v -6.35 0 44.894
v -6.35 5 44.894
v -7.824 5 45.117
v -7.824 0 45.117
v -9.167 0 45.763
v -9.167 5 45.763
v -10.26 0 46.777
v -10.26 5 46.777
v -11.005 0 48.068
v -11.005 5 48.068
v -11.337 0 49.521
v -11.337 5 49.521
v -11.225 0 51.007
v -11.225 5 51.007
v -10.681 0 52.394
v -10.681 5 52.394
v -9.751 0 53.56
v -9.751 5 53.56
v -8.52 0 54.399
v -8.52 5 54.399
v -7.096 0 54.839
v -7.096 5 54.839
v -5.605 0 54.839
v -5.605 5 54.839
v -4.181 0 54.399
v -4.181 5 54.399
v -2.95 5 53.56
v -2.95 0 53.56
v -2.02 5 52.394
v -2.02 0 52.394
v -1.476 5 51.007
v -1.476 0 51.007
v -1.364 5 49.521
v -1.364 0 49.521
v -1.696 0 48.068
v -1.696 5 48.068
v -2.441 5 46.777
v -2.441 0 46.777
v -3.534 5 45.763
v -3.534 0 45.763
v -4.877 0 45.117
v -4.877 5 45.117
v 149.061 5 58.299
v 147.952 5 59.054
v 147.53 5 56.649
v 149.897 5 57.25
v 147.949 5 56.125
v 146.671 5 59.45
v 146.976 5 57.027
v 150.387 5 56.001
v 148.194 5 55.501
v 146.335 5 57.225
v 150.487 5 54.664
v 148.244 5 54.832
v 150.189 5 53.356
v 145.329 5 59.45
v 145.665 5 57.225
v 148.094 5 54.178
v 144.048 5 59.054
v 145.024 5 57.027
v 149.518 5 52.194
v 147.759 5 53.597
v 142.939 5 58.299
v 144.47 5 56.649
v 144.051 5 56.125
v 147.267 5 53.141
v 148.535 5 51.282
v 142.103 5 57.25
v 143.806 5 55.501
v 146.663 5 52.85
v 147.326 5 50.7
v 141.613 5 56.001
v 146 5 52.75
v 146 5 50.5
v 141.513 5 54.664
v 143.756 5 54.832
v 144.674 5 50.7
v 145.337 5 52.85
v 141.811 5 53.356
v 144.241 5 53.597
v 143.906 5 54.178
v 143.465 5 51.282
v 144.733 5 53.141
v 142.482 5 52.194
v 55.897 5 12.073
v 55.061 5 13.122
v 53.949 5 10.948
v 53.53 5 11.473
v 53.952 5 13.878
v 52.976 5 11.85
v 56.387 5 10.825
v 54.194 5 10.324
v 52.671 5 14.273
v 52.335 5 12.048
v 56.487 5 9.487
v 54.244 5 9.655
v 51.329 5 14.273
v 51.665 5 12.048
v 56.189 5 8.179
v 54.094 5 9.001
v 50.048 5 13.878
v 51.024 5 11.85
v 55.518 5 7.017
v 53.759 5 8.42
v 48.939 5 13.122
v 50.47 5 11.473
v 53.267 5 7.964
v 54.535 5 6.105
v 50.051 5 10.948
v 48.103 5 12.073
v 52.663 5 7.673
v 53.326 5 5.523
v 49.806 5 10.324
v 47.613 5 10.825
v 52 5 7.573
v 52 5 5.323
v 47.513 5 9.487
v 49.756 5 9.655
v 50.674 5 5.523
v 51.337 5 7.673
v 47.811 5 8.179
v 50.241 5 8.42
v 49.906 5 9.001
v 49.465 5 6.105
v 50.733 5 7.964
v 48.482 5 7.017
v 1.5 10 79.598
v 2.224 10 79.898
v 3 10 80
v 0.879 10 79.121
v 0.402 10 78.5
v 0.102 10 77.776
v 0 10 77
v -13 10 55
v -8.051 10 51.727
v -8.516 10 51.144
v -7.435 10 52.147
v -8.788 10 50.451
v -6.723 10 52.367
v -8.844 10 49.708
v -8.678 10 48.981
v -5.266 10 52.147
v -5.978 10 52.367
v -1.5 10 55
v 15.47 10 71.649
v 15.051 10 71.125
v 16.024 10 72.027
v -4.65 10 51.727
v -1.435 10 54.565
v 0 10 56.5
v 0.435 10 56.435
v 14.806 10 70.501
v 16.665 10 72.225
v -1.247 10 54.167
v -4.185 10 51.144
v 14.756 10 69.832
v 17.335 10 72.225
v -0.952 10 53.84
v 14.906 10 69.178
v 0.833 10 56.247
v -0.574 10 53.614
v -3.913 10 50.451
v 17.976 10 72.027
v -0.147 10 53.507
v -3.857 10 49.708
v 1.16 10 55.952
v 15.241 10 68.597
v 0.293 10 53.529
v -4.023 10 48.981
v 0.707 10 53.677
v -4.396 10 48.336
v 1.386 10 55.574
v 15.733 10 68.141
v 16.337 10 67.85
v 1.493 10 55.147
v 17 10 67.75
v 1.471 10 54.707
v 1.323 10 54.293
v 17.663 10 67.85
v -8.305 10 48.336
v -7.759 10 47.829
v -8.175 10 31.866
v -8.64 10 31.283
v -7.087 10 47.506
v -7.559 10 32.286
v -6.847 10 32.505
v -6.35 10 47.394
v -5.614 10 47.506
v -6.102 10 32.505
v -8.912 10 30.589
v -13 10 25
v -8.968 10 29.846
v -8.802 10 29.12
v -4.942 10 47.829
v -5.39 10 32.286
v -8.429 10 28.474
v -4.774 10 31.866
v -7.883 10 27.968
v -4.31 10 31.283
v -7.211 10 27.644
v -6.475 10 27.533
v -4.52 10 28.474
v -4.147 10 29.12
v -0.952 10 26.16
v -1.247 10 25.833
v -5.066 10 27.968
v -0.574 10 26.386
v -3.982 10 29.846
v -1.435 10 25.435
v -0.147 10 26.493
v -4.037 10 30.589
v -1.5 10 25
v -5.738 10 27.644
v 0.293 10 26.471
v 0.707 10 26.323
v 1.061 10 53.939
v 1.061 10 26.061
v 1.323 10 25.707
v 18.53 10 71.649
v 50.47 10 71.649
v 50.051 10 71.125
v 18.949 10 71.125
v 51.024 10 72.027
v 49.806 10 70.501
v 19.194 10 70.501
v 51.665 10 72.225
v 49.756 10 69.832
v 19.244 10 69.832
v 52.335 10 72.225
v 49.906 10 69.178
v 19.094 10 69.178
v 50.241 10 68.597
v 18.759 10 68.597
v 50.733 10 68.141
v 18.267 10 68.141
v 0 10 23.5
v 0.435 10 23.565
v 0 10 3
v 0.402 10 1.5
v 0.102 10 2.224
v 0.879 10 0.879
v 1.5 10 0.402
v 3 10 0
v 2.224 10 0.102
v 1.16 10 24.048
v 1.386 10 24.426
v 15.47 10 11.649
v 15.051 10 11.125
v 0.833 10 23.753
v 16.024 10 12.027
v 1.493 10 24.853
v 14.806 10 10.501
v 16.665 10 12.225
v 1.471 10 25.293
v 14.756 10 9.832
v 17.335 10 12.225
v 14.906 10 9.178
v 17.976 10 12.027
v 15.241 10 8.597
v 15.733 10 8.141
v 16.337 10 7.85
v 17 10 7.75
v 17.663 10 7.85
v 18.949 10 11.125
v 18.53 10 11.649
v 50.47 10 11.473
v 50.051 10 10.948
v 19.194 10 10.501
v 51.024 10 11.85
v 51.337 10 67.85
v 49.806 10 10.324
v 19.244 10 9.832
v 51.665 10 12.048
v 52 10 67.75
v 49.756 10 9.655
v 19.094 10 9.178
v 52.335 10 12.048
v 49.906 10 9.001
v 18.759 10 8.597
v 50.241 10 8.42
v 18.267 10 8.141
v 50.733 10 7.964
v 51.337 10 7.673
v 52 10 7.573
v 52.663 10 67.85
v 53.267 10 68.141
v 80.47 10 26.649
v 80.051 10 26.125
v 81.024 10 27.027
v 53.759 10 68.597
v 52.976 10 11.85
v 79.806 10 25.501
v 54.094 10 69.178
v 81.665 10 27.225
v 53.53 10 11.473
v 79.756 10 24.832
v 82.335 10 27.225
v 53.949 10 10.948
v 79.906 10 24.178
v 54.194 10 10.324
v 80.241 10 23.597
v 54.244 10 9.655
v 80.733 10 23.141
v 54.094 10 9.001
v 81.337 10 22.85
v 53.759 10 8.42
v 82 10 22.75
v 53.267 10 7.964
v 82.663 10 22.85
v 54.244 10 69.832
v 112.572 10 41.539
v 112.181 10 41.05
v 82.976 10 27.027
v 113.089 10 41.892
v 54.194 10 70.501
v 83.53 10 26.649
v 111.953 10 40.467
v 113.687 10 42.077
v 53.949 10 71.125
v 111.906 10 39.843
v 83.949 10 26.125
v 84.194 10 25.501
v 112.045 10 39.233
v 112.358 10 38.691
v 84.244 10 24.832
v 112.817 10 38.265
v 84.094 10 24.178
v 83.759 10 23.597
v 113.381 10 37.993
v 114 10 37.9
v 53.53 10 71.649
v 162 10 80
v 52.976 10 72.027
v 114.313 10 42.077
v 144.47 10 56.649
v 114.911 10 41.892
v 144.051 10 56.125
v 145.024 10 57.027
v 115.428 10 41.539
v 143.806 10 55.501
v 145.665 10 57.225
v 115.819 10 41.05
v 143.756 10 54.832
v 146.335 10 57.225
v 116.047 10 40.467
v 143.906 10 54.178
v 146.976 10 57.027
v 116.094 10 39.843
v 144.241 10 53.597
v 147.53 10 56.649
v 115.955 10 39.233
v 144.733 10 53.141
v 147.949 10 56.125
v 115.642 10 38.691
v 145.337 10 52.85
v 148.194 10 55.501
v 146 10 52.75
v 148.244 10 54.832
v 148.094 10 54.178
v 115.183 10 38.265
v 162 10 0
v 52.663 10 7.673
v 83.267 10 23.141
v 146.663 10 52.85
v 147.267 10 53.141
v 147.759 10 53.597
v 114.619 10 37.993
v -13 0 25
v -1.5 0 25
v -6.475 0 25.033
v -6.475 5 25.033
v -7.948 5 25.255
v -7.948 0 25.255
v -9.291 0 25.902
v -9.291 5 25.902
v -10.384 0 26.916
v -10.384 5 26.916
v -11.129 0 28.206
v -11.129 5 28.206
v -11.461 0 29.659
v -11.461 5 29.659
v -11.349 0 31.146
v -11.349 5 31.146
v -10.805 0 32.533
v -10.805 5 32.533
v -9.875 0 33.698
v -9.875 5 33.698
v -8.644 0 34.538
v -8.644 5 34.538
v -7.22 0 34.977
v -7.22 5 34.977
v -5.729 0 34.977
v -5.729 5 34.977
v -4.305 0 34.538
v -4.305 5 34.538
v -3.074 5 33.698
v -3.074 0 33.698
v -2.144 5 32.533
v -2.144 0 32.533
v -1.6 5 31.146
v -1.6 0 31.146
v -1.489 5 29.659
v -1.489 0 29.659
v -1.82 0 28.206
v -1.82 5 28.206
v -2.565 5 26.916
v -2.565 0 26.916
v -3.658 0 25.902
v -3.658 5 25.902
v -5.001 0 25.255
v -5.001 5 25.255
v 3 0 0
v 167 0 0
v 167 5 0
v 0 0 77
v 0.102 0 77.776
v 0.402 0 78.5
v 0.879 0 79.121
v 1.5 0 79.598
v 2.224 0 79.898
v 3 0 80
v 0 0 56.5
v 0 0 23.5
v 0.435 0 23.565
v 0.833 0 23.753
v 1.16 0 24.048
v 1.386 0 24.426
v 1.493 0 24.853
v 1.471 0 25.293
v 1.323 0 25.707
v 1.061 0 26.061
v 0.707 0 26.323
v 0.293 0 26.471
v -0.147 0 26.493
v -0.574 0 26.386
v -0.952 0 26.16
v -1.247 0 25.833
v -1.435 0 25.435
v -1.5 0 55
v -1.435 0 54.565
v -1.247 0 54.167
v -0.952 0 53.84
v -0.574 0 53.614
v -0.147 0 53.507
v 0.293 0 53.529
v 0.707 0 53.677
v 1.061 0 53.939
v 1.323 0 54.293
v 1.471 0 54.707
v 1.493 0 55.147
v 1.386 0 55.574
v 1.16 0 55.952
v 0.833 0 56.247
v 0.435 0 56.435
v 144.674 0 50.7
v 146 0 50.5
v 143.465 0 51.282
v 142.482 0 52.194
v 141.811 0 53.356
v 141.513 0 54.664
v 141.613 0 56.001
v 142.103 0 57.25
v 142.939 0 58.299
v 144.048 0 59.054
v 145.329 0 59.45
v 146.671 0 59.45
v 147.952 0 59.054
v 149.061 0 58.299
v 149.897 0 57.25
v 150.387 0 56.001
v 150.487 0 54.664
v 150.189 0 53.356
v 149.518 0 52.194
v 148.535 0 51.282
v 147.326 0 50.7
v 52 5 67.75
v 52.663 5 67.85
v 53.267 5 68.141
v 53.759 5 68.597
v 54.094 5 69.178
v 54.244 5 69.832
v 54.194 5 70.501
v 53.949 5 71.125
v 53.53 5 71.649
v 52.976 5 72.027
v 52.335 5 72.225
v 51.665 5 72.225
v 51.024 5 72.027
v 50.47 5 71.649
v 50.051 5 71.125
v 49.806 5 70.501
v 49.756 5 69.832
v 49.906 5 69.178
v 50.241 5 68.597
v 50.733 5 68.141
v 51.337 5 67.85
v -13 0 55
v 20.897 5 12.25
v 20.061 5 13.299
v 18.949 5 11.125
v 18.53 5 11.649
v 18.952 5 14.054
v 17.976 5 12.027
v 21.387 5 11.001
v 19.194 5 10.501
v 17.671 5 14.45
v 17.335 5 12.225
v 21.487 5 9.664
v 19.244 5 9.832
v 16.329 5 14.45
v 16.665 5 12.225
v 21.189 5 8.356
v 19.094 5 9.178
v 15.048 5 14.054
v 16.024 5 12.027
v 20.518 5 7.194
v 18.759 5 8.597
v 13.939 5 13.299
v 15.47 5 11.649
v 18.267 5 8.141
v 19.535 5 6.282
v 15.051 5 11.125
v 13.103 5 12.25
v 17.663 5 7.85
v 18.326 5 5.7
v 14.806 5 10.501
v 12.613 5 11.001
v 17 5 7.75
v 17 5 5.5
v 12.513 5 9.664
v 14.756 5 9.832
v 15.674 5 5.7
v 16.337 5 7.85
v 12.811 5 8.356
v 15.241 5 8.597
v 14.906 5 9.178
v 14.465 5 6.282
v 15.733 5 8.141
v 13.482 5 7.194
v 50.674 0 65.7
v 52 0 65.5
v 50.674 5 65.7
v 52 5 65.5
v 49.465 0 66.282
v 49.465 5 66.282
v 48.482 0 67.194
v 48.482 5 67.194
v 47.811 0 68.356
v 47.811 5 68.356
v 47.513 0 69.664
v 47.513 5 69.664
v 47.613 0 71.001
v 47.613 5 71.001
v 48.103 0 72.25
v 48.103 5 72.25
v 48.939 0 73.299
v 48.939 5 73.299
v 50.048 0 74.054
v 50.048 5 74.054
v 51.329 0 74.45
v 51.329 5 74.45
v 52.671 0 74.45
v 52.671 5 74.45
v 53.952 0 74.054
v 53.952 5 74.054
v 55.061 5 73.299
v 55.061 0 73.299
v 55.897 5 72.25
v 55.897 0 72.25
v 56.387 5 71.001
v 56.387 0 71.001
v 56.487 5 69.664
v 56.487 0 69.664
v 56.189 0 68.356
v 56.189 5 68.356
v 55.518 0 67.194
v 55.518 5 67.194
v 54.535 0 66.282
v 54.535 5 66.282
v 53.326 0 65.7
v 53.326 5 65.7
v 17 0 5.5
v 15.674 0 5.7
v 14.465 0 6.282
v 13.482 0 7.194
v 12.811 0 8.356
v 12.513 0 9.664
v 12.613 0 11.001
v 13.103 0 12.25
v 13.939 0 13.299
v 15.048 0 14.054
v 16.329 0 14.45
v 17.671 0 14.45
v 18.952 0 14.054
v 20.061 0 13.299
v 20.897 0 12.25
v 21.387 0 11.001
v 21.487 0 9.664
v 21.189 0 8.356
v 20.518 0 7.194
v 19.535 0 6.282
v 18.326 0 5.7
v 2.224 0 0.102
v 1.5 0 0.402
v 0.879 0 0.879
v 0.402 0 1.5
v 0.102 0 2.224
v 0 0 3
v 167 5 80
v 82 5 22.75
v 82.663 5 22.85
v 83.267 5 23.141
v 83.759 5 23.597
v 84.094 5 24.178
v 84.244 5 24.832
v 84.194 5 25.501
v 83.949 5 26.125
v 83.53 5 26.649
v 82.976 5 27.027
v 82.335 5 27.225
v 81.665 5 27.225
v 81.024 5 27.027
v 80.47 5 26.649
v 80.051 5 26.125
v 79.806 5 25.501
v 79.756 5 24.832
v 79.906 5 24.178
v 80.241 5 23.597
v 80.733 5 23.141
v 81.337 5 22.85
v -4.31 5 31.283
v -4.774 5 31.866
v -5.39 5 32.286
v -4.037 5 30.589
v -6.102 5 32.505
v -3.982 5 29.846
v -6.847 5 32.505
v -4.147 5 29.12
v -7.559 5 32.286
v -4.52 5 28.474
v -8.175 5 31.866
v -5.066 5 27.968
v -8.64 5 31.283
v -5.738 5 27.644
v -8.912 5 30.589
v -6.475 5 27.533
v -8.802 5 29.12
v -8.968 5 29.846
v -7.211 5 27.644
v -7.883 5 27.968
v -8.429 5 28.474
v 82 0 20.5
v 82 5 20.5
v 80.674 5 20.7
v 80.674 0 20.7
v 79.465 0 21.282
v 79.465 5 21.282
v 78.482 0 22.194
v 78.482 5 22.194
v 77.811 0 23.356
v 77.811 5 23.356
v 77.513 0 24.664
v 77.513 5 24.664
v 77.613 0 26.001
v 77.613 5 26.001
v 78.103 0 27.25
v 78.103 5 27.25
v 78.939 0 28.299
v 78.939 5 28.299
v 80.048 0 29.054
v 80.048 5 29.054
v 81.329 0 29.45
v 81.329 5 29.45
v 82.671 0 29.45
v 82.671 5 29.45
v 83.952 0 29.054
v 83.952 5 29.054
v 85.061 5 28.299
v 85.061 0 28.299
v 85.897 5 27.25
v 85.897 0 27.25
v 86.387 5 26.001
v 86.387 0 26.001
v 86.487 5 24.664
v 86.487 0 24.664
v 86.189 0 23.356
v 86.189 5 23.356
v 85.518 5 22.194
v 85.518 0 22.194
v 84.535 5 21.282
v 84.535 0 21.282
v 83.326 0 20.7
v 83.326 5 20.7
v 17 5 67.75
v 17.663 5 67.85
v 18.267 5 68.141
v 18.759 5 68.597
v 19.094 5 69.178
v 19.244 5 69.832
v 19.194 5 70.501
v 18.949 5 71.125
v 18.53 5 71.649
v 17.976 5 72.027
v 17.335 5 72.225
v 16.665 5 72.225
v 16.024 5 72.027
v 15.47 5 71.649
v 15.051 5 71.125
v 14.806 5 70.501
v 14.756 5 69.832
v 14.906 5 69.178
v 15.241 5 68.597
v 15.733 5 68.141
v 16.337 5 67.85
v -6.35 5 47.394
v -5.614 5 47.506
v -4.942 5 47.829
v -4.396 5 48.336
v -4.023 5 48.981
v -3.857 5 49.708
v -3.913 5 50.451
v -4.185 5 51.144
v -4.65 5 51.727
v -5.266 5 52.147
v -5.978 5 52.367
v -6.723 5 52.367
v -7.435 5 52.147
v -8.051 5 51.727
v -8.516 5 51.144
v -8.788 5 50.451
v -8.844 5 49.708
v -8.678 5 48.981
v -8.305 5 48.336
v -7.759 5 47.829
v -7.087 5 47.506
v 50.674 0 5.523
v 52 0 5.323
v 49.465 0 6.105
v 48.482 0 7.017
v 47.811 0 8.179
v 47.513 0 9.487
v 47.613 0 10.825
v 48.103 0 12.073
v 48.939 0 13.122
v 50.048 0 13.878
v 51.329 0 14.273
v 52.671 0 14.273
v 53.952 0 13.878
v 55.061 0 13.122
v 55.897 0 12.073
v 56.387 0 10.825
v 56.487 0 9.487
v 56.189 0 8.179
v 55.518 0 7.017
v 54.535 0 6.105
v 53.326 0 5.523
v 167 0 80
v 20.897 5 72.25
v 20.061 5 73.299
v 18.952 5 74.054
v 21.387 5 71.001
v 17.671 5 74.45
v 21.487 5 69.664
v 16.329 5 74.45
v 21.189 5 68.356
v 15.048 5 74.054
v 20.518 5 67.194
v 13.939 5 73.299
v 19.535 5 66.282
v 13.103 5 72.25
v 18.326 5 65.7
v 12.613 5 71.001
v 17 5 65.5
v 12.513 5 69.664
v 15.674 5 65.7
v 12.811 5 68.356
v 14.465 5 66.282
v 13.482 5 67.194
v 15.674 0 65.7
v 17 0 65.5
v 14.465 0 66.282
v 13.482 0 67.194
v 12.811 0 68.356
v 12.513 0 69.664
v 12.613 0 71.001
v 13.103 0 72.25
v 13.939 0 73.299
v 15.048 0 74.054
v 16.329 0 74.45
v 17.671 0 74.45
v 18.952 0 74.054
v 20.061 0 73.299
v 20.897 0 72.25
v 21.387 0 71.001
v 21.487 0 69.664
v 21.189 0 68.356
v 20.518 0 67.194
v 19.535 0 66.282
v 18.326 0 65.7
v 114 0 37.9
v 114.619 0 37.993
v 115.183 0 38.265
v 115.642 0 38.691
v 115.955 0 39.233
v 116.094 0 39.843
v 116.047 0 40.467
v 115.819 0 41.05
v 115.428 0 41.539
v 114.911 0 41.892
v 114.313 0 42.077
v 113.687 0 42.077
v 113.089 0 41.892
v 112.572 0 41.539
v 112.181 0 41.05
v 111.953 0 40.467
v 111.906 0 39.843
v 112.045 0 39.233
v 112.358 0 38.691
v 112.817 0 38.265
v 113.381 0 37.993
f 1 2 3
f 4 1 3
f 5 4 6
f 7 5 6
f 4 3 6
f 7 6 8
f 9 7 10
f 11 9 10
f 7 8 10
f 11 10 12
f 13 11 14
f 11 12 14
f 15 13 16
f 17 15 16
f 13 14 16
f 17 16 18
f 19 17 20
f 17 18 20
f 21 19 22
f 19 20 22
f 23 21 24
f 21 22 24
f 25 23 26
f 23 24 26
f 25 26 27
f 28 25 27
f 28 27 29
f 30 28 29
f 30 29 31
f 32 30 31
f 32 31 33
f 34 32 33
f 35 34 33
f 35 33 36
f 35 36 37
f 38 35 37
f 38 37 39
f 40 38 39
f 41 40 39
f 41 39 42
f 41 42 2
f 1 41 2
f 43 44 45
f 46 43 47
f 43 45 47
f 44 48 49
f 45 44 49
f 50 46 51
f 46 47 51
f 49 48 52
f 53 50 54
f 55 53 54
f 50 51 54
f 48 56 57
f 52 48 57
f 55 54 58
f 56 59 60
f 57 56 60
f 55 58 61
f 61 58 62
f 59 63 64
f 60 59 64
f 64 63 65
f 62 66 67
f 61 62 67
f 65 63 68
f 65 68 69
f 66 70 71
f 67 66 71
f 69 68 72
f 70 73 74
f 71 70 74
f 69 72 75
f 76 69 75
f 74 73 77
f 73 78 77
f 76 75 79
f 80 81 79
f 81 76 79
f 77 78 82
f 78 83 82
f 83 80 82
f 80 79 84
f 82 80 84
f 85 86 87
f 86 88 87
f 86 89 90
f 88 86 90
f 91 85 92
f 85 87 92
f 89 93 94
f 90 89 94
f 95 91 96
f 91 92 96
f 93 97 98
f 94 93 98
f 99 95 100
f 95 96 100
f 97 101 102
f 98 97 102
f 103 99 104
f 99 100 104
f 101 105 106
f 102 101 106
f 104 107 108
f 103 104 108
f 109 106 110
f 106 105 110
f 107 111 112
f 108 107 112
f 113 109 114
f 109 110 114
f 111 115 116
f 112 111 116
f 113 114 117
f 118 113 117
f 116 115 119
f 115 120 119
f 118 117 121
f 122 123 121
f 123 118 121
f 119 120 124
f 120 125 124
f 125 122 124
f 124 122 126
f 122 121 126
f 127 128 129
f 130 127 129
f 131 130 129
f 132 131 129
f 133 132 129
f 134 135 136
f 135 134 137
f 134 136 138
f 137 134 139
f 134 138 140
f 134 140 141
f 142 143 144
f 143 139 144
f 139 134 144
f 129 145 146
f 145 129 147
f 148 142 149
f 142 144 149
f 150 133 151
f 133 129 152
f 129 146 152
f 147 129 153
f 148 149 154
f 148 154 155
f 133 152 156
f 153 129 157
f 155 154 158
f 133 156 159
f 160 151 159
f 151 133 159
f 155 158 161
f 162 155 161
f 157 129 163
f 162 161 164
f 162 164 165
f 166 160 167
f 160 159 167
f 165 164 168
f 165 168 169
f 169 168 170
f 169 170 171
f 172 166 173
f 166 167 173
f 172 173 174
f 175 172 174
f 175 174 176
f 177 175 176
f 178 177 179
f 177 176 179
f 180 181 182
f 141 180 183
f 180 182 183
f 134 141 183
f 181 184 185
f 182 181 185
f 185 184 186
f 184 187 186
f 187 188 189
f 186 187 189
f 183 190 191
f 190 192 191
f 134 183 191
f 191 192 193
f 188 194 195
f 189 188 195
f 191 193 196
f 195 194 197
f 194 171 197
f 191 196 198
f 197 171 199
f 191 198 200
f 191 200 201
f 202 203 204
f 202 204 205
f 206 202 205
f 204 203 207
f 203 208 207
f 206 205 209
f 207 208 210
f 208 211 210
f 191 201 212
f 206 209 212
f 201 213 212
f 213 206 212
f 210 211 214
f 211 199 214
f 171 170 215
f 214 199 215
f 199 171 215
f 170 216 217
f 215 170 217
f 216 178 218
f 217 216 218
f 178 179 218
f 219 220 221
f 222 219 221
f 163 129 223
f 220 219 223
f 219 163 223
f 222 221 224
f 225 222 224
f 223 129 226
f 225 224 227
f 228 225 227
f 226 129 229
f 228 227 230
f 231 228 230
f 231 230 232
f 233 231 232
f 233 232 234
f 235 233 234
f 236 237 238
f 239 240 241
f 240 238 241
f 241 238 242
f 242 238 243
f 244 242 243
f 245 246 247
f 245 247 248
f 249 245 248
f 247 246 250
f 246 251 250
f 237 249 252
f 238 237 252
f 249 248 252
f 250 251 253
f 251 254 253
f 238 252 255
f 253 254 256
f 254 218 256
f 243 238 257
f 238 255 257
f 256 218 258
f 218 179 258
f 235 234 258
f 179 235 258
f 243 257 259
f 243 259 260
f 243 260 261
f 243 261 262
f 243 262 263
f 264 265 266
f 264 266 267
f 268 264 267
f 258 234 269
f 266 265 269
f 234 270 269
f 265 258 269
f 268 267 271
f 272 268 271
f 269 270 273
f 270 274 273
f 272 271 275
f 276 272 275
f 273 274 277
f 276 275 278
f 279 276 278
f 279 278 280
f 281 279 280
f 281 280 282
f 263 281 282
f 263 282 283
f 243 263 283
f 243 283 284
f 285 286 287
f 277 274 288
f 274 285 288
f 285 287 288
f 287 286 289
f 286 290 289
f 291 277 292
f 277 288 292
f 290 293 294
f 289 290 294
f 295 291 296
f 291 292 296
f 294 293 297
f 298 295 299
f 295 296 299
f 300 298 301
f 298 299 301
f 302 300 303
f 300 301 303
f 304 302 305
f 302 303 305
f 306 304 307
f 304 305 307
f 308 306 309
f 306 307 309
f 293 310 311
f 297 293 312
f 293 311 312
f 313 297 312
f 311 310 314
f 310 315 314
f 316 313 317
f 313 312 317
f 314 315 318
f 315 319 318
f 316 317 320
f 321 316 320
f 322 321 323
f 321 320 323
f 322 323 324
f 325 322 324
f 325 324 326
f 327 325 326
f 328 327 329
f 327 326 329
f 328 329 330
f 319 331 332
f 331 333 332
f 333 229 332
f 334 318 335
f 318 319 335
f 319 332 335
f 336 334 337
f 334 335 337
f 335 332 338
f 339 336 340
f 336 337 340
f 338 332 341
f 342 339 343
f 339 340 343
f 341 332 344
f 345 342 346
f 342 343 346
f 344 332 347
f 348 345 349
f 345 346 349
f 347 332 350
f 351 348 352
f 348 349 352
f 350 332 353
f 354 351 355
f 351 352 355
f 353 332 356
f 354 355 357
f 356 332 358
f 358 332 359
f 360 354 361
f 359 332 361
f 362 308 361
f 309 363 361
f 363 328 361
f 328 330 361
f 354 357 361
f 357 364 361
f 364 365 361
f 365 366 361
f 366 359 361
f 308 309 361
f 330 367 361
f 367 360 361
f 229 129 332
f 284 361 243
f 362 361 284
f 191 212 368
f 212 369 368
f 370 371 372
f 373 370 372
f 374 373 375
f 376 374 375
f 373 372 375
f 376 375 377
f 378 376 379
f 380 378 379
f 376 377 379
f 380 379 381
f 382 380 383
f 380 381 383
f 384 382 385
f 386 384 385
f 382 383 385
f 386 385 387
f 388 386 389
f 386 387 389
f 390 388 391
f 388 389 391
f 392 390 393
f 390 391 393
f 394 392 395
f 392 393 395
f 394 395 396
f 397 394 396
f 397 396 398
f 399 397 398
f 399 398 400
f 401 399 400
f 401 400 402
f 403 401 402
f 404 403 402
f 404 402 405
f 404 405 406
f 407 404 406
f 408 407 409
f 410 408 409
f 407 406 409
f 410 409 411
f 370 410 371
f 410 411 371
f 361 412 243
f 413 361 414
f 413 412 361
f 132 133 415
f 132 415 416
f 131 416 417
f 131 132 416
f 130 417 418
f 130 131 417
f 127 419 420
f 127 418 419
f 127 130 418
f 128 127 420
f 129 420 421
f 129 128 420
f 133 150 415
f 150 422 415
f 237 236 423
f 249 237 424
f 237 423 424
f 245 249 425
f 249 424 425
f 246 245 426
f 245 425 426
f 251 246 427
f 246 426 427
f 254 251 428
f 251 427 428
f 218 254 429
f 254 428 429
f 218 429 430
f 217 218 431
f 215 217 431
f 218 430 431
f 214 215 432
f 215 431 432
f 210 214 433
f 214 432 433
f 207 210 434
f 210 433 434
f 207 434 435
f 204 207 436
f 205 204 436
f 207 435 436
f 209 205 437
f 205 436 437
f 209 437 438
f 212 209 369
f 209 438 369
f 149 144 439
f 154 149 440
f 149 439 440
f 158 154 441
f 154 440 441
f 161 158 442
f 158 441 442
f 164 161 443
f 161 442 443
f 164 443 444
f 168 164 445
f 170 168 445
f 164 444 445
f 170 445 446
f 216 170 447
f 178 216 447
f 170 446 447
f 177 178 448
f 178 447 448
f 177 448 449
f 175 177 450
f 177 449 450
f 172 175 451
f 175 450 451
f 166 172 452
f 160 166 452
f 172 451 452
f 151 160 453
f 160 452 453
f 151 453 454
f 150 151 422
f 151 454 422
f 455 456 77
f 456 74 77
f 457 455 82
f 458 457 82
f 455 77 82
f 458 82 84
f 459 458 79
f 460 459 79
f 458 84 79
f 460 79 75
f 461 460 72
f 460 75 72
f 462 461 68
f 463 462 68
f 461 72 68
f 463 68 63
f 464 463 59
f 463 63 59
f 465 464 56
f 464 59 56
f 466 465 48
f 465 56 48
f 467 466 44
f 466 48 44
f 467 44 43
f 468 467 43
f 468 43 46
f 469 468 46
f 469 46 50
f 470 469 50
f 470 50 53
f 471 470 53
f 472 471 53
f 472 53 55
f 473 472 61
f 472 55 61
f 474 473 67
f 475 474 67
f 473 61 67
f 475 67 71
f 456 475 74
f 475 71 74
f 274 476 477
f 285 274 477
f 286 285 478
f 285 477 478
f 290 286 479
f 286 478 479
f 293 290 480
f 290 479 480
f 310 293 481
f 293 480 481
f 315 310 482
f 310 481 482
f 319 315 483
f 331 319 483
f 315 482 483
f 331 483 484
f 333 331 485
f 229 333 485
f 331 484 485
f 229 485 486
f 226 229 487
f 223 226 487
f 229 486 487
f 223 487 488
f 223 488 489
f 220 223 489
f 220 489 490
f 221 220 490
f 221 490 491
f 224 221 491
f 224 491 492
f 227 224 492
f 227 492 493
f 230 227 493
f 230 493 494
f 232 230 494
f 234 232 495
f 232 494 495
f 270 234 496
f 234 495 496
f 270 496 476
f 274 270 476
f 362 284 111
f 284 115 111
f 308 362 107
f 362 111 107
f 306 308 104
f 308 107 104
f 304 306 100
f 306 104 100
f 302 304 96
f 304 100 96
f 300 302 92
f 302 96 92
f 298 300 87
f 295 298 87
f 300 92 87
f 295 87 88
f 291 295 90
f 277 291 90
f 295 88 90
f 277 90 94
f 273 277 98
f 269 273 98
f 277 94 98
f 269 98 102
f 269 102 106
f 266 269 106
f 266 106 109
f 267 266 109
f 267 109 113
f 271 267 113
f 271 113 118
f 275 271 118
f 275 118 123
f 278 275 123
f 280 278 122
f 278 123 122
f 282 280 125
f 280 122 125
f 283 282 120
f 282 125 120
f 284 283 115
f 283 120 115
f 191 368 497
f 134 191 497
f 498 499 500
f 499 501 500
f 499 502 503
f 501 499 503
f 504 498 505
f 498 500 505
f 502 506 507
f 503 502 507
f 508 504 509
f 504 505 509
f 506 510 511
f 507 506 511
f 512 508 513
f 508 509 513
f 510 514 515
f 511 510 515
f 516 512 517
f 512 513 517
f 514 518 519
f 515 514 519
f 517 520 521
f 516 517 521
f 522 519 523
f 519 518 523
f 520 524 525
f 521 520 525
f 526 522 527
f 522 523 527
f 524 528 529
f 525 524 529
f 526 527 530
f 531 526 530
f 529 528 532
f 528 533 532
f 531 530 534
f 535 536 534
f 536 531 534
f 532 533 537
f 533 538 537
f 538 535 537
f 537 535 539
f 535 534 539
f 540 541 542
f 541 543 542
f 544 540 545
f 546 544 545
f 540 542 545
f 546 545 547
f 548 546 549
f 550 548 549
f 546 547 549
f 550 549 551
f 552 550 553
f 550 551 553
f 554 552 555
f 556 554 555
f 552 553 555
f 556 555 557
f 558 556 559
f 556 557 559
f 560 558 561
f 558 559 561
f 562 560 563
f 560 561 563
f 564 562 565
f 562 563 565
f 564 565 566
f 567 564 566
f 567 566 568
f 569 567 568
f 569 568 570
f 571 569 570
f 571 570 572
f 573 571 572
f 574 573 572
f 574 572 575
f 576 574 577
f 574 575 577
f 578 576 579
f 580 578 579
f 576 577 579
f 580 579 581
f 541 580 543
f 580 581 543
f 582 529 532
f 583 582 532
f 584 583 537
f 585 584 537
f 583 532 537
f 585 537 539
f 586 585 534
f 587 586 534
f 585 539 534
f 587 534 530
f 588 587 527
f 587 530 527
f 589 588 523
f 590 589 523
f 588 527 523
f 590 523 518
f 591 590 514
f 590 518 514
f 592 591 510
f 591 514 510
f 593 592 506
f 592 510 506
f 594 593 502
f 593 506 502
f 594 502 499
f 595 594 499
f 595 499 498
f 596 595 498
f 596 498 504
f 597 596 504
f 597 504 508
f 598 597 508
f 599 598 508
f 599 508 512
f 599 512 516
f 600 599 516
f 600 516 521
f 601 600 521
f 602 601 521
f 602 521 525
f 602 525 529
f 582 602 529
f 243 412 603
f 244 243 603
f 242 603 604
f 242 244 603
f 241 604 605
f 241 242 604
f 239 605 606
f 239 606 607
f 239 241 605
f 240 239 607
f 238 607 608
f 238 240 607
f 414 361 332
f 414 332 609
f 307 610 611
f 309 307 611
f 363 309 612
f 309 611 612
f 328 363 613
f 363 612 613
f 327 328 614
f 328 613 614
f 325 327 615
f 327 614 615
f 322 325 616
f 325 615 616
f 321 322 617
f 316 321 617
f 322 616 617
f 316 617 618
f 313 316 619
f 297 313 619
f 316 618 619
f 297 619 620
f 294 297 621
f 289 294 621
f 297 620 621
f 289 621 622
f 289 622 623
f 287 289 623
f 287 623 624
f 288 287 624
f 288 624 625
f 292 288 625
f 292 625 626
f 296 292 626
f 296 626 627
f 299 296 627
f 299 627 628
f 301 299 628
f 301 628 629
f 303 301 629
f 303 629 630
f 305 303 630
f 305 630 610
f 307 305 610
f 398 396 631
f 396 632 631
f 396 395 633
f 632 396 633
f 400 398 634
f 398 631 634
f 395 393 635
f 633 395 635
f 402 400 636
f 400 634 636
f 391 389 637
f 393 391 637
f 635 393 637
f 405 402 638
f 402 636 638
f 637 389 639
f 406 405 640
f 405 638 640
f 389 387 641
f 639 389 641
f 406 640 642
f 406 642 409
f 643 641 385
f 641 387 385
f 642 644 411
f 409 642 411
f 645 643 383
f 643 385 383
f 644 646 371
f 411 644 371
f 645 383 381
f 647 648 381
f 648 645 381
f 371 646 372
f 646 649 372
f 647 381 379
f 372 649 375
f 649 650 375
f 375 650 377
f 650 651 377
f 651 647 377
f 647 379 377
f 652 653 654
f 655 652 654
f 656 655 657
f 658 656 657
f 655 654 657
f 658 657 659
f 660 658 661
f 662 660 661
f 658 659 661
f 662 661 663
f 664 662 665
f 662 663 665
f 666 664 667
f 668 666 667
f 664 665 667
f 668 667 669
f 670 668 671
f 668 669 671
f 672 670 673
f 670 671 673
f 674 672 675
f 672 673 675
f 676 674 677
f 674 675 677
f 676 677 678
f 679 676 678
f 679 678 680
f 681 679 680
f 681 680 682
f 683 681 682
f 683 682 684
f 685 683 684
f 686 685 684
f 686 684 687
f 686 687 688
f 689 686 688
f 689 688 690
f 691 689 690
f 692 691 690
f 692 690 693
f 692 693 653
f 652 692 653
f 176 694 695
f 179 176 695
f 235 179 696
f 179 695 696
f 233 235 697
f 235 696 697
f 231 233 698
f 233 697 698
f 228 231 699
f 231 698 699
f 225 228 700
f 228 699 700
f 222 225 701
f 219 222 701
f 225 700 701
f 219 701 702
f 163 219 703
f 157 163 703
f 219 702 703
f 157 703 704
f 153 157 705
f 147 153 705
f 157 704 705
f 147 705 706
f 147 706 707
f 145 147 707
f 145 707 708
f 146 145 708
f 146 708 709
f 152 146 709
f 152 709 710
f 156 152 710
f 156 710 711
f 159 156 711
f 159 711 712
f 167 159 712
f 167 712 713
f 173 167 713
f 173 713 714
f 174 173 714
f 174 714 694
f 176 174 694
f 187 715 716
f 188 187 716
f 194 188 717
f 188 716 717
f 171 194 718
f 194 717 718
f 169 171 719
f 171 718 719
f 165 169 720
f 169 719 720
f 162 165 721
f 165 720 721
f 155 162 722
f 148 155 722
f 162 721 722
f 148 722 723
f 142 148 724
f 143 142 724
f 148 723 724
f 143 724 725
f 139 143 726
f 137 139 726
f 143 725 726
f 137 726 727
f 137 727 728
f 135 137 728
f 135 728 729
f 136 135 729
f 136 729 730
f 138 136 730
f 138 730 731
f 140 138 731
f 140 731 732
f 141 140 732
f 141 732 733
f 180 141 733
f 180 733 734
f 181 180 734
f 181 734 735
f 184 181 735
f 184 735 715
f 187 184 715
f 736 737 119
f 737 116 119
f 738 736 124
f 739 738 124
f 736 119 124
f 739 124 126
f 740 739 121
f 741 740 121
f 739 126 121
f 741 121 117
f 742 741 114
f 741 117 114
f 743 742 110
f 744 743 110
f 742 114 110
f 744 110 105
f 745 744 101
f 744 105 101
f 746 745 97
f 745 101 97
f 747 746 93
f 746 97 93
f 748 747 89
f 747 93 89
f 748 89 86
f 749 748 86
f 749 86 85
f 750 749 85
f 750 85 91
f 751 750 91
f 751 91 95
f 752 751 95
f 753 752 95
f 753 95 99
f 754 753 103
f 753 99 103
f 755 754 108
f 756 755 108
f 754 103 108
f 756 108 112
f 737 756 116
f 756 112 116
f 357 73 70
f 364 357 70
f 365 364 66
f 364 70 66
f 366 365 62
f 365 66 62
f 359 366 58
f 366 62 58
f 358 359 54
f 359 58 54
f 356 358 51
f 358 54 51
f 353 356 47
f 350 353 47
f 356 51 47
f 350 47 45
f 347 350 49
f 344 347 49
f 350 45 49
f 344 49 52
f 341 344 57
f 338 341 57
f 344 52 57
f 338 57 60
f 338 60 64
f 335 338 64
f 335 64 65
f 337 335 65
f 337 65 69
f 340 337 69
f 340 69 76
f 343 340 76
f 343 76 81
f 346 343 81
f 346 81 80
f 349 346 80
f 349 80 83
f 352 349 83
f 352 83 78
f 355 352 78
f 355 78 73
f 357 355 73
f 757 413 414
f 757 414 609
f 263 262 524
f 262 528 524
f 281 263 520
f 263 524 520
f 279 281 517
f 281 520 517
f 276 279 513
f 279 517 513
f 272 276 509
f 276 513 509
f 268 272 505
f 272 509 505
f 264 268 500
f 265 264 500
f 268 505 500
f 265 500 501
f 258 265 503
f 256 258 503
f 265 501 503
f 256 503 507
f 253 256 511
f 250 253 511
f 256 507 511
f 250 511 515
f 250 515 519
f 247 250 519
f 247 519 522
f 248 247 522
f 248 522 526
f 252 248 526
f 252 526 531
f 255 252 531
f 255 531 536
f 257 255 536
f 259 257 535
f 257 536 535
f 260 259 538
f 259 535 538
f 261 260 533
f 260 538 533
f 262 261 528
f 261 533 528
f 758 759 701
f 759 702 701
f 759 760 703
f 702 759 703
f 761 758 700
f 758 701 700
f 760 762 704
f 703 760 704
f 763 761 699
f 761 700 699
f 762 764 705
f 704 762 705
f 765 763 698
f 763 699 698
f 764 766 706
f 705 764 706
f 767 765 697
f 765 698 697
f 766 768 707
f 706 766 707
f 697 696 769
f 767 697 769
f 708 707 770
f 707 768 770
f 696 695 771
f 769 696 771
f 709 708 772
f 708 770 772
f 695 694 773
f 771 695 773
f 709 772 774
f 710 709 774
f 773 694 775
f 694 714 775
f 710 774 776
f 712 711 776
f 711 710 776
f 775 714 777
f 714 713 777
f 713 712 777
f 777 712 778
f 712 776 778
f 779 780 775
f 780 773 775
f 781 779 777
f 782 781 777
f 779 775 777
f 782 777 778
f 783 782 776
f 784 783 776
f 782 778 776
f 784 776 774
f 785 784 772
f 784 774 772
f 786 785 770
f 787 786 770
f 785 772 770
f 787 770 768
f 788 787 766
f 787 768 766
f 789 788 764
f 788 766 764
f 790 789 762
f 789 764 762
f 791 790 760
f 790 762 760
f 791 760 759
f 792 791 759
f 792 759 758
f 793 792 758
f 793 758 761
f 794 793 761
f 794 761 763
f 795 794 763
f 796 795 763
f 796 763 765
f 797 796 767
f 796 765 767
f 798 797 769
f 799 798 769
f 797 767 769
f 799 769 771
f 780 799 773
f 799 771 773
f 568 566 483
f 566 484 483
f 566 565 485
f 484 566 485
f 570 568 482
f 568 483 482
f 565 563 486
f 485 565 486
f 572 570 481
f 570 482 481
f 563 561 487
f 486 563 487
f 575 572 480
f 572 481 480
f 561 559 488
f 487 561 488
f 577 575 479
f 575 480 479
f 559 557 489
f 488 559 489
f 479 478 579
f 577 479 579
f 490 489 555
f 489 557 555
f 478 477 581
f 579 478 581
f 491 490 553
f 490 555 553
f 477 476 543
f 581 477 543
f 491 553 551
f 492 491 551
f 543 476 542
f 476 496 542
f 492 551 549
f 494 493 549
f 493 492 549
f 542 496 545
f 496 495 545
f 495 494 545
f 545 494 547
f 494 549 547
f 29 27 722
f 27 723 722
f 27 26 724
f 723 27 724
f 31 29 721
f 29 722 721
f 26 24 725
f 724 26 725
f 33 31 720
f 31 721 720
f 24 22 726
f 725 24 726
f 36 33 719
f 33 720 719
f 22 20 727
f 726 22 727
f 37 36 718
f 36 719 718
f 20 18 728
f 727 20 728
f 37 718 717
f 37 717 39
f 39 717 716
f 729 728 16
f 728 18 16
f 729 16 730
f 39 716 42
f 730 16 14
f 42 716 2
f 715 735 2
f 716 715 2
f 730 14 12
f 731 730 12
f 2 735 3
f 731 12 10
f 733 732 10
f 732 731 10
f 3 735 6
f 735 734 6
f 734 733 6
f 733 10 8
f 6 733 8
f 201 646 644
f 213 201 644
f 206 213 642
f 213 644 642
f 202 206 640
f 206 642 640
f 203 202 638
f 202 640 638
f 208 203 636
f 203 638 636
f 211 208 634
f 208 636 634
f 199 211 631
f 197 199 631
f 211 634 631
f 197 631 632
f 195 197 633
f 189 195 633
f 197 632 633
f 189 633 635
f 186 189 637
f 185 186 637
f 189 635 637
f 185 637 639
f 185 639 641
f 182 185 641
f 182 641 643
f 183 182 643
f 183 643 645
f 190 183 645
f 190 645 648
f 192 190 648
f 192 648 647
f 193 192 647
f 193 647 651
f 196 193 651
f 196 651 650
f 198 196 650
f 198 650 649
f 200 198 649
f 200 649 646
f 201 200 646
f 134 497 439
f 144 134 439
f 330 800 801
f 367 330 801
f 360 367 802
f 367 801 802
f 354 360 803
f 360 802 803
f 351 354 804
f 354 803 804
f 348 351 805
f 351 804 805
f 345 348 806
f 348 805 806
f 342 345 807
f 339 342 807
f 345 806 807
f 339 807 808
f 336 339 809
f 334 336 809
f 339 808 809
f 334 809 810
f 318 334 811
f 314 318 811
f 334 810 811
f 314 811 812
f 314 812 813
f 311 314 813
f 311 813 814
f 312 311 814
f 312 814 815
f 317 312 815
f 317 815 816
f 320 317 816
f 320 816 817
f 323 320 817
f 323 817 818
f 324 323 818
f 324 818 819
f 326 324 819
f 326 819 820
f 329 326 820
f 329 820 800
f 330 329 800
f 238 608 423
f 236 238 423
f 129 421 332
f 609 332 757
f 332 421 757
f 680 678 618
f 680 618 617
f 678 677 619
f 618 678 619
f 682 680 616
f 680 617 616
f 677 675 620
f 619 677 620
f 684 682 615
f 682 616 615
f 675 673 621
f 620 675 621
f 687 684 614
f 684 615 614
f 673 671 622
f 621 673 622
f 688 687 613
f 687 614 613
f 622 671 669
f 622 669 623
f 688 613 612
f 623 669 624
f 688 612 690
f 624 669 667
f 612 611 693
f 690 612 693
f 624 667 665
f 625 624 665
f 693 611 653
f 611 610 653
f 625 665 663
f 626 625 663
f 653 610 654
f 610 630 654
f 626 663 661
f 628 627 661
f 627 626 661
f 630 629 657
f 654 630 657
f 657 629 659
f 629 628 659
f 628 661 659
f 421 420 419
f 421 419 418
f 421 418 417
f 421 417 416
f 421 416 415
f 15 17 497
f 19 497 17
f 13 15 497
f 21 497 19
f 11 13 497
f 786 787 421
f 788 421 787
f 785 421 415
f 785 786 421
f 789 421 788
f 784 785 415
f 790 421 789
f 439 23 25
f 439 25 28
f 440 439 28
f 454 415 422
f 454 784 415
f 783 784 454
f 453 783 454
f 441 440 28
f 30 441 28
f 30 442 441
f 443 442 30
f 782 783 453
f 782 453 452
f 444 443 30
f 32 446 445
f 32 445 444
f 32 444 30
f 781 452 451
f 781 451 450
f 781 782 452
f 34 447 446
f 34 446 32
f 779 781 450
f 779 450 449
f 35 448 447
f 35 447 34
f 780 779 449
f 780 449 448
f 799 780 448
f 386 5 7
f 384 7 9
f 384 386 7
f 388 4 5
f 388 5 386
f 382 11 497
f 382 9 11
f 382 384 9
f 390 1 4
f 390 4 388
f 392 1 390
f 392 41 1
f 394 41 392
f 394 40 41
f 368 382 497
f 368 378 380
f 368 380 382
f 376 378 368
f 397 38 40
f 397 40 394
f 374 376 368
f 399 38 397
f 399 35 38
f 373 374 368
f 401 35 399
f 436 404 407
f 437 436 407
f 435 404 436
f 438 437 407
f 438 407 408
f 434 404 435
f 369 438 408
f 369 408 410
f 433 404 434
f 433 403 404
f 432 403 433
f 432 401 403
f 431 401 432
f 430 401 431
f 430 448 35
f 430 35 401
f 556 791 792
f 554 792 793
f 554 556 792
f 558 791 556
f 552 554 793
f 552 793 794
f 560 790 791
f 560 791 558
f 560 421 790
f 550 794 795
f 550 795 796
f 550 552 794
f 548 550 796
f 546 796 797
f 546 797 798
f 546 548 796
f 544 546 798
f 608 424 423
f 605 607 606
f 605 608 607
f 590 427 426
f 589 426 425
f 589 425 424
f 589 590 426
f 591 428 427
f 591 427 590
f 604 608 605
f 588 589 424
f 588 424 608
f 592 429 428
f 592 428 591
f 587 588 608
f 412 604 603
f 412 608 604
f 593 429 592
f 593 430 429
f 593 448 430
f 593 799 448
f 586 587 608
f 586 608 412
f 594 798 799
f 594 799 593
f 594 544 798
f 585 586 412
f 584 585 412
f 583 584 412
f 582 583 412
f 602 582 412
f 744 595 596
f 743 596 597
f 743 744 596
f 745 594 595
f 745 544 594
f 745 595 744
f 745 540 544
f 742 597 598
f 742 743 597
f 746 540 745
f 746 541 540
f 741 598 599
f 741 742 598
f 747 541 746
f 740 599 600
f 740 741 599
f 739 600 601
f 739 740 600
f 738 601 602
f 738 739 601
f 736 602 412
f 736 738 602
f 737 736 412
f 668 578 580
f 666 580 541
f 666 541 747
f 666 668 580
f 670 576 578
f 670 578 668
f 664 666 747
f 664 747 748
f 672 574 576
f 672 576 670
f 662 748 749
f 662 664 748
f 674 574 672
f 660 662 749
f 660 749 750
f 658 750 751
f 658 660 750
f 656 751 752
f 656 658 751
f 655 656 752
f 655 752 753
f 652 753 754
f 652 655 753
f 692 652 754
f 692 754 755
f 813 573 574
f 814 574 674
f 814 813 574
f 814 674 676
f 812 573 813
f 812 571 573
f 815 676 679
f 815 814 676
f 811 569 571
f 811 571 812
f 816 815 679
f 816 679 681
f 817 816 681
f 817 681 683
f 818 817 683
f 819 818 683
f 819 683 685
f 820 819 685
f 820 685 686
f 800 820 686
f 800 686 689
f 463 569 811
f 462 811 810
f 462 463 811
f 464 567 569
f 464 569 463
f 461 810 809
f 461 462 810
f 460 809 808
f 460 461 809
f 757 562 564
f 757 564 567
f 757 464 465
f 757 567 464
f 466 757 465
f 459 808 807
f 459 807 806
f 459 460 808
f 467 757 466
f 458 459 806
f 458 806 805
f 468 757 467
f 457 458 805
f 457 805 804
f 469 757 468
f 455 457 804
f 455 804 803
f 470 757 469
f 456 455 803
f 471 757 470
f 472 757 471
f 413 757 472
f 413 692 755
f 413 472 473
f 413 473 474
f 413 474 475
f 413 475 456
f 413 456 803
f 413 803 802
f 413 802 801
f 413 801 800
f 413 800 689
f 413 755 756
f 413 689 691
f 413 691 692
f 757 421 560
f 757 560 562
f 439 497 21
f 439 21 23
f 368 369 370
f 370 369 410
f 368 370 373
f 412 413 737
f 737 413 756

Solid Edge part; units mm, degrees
sketch "Sketch1" plane through (0, 0, 0) normal (0, -1, 0) x (1, 0, 0)
  line L0 (0, 0) -> (167, 0)
  line L1 (167, 0) -> (167, 80)
  line L2 (0, 80) -> (167, 80)
  line L3 (0, 55) -> (0, 80)
  line L4 (-13, 55) -> (0, 55)
  line L5 (-13, 25) -> (-13, 55)
  line L6 (0, 25) -> (-13, 25)
  line L7 (0, 0) -> (0, 25)
extrude "Protrusion1" add sketch "Sketch1" against normal blind 10
hole "Furo_1" at (0, 0, 55) direction (0, 1, 0) diameter 3 end up to next
hole "Hole1" at (0, 0, 25) direction (0, 1, 0) diameter 3 end up to next
hole "Furo_3" at (-6.4746, 0, 30.0331) direction (0, 1, 0) diameter 5 end up to next counterbore diameter 10 counterbore depth 5
hole "Hole2" at (-6.3505, 0, 49.8945) direction (0, 1, 0) diameter 5 end up to next counterbore diameter 10 counterbore depth 5
hole "Furo_7" at (17, 0, 70) direction (0, 1, 0) diameter 4.5 end up to next counterbore diameter 9 counterbore depth 5
hole "Hole3" at (52, 0, 70) direction (0, 1, 0) diameter 4.5 end up to next counterbore diameter 9 counterbore depth 5
hole "Hole4" at (52, 0, 9.8232) direction (0, 1, 0) diameter 4.5 end up to next counterbore diameter 9 counterbore depth 5
hole "Hole5" at (17, 0, 10) direction (0, 1, 0) diameter 4.5 end up to next counterbore diameter 9 counterbore depth 5
hole "Hole6" at (82, 0, 25) direction (0, 1, 0) diameter 4.5 end up to next counterbore diameter 9 counterbore depth 5
hole "Hole7" at (146, 0, 55) direction (0, 1, 0) diameter 4.5 end up to next counterbore diameter 9 counterbore depth 5
hole "Furo_13" at (114, 0, 40) direction (0, 1, 0) diameter 4.2 end through all
sketch "Sketch2" plane through (83.5, 5, 0) normal (0, 0, -1) x (1, 0, 0)
  line L0 (78.5, -5) -> (83.5, 0)
  line L1 (83.5, -5) -> (78.5, -5)
extrude "Recorte_Extrudado_1" cut sketch "Sketch2" against normal blind 110.0031 material side at (164.5354, 7.5354, 0)
fillet "Redondo_1" radius 3 2 edges at (0, 5, 0) (0, 5, 80)
properties material "PVC"
